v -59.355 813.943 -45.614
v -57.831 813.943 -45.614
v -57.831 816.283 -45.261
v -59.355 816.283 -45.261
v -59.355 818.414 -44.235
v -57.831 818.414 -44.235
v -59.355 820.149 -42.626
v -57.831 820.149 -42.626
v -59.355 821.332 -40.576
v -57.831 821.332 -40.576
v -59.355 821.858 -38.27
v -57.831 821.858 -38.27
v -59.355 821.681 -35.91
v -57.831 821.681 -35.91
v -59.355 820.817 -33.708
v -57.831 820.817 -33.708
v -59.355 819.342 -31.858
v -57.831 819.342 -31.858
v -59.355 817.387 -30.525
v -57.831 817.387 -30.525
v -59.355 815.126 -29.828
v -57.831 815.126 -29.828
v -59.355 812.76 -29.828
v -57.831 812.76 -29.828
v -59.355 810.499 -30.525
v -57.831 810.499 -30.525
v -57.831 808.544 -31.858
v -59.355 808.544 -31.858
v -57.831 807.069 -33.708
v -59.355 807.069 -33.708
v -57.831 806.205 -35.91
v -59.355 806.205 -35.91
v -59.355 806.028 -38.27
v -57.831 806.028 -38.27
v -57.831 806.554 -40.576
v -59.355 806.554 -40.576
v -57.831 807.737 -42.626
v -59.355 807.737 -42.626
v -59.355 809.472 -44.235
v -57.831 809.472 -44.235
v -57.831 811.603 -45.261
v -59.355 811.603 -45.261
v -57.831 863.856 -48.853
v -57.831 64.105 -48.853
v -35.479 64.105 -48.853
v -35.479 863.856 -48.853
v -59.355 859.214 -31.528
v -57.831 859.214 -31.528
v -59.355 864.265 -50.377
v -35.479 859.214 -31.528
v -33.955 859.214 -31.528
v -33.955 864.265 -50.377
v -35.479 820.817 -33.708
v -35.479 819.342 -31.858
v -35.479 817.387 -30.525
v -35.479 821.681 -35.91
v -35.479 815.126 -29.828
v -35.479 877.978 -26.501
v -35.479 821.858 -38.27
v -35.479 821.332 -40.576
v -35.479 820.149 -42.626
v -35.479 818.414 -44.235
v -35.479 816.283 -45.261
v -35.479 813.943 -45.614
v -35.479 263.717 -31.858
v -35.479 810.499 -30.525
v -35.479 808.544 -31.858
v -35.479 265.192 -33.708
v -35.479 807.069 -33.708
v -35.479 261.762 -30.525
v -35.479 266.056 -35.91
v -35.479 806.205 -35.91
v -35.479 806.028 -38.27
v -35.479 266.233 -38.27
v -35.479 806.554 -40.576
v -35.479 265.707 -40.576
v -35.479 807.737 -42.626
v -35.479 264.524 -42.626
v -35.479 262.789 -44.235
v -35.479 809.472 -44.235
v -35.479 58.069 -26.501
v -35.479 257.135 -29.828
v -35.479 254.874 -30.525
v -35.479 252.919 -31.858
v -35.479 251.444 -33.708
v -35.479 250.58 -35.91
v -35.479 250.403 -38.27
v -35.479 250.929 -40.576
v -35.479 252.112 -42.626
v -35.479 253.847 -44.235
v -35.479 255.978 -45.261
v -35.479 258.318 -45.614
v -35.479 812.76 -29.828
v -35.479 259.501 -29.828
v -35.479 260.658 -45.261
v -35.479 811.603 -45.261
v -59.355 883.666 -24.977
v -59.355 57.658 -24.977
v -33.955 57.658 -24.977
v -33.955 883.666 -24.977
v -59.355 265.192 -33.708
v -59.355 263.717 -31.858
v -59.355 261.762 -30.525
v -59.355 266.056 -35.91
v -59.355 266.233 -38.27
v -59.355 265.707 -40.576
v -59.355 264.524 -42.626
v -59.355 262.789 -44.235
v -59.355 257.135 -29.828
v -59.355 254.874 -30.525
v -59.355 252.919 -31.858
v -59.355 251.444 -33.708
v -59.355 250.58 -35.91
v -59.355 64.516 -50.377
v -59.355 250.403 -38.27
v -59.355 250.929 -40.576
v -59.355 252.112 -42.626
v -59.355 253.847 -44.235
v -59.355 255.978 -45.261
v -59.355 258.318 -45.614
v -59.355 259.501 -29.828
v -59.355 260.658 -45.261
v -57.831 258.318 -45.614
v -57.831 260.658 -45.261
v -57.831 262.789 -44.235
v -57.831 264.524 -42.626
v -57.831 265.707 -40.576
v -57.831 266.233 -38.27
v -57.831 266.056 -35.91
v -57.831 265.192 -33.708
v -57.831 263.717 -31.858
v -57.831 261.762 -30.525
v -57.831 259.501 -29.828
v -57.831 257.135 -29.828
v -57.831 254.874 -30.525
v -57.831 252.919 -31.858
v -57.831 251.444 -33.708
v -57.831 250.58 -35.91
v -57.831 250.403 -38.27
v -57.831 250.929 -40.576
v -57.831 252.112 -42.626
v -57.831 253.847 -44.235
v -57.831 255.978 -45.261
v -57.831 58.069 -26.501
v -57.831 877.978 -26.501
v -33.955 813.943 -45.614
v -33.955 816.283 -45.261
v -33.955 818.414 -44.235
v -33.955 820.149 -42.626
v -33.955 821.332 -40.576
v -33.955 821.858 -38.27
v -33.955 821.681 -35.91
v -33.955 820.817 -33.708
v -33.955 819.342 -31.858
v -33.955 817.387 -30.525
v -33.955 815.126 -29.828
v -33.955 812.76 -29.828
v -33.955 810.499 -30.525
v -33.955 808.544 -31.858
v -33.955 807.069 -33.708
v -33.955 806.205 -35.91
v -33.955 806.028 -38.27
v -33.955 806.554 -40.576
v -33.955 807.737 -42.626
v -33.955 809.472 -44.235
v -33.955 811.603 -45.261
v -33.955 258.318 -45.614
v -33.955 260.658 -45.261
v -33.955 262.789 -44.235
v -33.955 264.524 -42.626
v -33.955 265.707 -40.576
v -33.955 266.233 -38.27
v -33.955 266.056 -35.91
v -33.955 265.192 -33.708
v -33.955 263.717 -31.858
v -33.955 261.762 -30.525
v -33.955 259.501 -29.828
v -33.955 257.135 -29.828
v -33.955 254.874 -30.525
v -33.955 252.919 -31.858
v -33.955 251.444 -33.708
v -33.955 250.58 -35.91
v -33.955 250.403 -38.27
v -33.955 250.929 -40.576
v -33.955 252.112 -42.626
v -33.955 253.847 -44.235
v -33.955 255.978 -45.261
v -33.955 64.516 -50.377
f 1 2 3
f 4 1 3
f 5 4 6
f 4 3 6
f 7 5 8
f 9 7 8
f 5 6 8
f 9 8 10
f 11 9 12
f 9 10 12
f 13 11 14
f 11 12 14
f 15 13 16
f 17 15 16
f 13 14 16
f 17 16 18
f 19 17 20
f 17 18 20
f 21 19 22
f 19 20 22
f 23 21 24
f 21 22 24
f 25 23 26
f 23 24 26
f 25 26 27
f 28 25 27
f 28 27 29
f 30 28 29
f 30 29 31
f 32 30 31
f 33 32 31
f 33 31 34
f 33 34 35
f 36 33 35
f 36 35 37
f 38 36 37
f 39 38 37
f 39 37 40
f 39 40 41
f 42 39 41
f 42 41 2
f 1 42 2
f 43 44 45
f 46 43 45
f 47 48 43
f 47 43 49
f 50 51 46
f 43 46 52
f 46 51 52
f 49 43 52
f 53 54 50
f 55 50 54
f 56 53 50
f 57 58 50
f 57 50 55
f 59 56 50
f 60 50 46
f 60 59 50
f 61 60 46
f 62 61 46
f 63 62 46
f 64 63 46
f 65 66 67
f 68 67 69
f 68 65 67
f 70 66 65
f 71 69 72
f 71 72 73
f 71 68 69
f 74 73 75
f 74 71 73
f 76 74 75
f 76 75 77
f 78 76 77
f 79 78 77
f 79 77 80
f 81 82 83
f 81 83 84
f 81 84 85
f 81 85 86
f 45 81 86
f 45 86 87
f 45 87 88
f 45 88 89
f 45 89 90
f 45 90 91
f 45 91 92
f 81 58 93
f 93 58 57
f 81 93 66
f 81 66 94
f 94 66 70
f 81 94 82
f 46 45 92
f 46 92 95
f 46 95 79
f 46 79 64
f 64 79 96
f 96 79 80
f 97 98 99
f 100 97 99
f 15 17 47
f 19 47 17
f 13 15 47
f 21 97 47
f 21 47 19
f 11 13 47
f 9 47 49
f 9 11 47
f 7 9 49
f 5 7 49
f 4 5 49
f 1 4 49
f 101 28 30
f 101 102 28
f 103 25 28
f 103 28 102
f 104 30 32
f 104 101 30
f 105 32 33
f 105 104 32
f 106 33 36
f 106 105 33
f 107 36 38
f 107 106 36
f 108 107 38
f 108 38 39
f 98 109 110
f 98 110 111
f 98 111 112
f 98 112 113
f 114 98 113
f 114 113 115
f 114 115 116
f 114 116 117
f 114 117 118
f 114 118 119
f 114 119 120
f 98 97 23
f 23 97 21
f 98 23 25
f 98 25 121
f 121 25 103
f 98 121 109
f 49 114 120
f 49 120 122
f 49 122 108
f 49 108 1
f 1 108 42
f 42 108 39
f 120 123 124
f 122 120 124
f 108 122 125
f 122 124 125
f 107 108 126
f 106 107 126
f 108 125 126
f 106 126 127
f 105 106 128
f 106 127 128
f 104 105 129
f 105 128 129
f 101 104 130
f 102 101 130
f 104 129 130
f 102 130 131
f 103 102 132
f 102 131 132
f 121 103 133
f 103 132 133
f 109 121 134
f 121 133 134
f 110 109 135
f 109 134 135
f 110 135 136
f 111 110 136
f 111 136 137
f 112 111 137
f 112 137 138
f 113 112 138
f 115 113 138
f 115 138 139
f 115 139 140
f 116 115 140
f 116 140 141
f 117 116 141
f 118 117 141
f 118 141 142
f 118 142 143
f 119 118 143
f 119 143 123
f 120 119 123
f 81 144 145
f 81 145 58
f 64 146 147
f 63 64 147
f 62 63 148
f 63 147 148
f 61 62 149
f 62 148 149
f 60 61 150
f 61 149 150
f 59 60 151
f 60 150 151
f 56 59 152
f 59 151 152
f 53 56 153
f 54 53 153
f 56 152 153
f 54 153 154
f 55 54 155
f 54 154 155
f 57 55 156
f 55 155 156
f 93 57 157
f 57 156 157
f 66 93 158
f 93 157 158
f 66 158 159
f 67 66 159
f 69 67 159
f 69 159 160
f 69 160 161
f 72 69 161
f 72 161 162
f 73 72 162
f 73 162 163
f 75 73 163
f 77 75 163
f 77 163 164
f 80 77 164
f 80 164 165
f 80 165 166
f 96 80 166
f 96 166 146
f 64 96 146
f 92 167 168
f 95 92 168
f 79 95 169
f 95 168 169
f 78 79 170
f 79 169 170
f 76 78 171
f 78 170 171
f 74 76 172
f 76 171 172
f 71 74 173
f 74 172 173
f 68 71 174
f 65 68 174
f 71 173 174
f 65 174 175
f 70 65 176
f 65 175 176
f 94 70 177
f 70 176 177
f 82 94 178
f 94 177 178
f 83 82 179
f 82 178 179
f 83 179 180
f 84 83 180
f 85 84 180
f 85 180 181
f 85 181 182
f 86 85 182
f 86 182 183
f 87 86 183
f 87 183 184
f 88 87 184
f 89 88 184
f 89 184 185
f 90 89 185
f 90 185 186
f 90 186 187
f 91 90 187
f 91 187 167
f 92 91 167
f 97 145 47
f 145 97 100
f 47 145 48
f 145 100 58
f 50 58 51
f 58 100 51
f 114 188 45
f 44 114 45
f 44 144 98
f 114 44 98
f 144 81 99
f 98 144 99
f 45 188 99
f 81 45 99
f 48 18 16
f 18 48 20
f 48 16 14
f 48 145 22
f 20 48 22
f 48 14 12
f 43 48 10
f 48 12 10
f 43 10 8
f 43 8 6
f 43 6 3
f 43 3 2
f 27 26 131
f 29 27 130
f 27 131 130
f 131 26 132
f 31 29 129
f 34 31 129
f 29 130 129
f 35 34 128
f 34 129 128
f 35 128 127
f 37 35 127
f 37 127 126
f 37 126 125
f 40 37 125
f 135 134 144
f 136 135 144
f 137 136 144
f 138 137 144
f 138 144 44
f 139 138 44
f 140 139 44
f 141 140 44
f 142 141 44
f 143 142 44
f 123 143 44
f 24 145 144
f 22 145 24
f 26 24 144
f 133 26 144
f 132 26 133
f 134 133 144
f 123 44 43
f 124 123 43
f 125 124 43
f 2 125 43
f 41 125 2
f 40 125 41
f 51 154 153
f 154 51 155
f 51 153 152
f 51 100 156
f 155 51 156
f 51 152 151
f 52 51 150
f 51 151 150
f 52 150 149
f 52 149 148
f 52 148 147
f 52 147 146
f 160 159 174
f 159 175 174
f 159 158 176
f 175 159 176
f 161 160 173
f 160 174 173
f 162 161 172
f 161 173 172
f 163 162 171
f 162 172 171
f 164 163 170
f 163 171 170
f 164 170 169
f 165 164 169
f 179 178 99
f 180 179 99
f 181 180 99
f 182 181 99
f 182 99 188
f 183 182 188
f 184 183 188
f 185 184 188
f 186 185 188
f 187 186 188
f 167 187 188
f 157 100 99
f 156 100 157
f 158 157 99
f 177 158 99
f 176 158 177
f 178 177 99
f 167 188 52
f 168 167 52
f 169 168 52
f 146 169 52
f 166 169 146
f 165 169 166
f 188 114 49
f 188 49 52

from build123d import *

# Parameters (mm, degrees)
SKETCH1_W               = 25.4
SKETCH1_H               = 25.4
SKETCH1_W_2             = 22.352
SKETCH1_H_2             = 22.352
BOSS_EXTRUDE1_DEPTH     = 883.666
SKETCH5_R               = 7.9375
CUT_EXTRUDE3_DEPTH      = 1
CUT_EXTRUDE3_DEPTH_BACK = 26.4
SKETCH6_R               = 7.9375
CUT_EXTRUDE4_DEPTH      = 1
CUT_EXTRUDE4_DEPTH_BACK = 26.4
CUT_EXTRUDE5_DEPTH      = 1
CUT_EXTRUDE5_DEPTH_BACK = 26.4
CUT_EXTRUDE6_DEPTH      = 1
CUT_EXTRUDE6_DEPTH_BACK = 26.4


with BuildPart() as part:
    # Sketch1 → Boss-Extrude1 (new body)
    with BuildSketch(Plane(origin=(0, 0, 0), x_dir=(1, 0, 0), z_dir=(0, 1, 0))):
        with Locations((-46.655111286, 37.676591231)):
            Rectangle(SKETCH1_W, SKETCH1_H)
        with Locations((-46.655111286, 37.676591231)):
            Rectangle(SKETCH1_W_2, SKETCH1_H_2, mode=Mode.SUBTRACT)
    extrude(amount=BOSS_EXTRUDE1_DEPTH)

    # Sketch5 → Cut-Extrude3 (cut, two sides)
    with BuildSketch(Plane(origin=(-33.955111286, 0, 0), x_dir=(0, 0, -1), z_dir=(1, 0, 0))) as cut_extrude3_sk:
        with Locations((37.676591231, 258.318)):
            Circle(SKETCH5_R)
    extrude(amount=CUT_EXTRUDE3_DEPTH, mode=Mode.SUBTRACT)
    extrude(cut_extrude3_sk.sketch, amount=-CUT_EXTRUDE3_DEPTH_BACK, mode=Mode.SUBTRACT)

    # Sketch6 → Cut-Extrude4 (cut, two sides)
    with BuildSketch(Plane(origin=(-33.955111286, 0, 0), x_dir=(0, 0, -1), z_dir=(1, 0, 0))) as cut_extrude4_sk:
        with Locations((37.676591231, 813.943)):
            Circle(SKETCH6_R)
    extrude(amount=CUT_EXTRUDE4_DEPTH, mode=Mode.SUBTRACT)
    extrude(cut_extrude4_sk.sketch, amount=-CUT_EXTRUDE4_DEPTH_BACK, mode=Mode.SUBTRACT)

    # Sketch7 → Cut-Extrude5 (cut, two sides)
    with BuildSketch(Plane(origin=(-33.955111286, 0, 0), x_dir=(0, 0, -1), z_dir=(1, 0, 0))) as cut_extrude5_sk:
        Polygon((24.976591231, 883.666), (31.52840716, 859.214290072), (50.376591231, 864.264645773), (50.376591231, 883.666), align=None)
    extrude(amount=CUT_EXTRUDE5_DEPTH, mode=Mode.SUBTRACT)
    extrude(cut_extrude5_sk.sketch, amount=-CUT_EXTRUDE5_DEPTH_BACK, mode=Mode.SUBTRACT)

    # Sketch8 → Cut-Extrude6 (cut, two sides)
    with BuildSketch(Plane(origin=(-33.955111286, 0, 0), x_dir=(0, 0, -1), z_dir=(1, 0, 0))) as cut_extrude6_sk:
        Polygon((24.976591231, 57.658), (24.976591231, 0), (50.376591231, 0), (50.376591231, 64.516), align=None)
    extrude(amount=CUT_EXTRUDE6_DEPTH, mode=Mode.SUBTRACT)
    extrude(cut_extrude6_sk.sketch, amount=-CUT_EXTRUDE6_DEPTH_BACK, mode=Mode.SUBTRACT)


solid = part.part
